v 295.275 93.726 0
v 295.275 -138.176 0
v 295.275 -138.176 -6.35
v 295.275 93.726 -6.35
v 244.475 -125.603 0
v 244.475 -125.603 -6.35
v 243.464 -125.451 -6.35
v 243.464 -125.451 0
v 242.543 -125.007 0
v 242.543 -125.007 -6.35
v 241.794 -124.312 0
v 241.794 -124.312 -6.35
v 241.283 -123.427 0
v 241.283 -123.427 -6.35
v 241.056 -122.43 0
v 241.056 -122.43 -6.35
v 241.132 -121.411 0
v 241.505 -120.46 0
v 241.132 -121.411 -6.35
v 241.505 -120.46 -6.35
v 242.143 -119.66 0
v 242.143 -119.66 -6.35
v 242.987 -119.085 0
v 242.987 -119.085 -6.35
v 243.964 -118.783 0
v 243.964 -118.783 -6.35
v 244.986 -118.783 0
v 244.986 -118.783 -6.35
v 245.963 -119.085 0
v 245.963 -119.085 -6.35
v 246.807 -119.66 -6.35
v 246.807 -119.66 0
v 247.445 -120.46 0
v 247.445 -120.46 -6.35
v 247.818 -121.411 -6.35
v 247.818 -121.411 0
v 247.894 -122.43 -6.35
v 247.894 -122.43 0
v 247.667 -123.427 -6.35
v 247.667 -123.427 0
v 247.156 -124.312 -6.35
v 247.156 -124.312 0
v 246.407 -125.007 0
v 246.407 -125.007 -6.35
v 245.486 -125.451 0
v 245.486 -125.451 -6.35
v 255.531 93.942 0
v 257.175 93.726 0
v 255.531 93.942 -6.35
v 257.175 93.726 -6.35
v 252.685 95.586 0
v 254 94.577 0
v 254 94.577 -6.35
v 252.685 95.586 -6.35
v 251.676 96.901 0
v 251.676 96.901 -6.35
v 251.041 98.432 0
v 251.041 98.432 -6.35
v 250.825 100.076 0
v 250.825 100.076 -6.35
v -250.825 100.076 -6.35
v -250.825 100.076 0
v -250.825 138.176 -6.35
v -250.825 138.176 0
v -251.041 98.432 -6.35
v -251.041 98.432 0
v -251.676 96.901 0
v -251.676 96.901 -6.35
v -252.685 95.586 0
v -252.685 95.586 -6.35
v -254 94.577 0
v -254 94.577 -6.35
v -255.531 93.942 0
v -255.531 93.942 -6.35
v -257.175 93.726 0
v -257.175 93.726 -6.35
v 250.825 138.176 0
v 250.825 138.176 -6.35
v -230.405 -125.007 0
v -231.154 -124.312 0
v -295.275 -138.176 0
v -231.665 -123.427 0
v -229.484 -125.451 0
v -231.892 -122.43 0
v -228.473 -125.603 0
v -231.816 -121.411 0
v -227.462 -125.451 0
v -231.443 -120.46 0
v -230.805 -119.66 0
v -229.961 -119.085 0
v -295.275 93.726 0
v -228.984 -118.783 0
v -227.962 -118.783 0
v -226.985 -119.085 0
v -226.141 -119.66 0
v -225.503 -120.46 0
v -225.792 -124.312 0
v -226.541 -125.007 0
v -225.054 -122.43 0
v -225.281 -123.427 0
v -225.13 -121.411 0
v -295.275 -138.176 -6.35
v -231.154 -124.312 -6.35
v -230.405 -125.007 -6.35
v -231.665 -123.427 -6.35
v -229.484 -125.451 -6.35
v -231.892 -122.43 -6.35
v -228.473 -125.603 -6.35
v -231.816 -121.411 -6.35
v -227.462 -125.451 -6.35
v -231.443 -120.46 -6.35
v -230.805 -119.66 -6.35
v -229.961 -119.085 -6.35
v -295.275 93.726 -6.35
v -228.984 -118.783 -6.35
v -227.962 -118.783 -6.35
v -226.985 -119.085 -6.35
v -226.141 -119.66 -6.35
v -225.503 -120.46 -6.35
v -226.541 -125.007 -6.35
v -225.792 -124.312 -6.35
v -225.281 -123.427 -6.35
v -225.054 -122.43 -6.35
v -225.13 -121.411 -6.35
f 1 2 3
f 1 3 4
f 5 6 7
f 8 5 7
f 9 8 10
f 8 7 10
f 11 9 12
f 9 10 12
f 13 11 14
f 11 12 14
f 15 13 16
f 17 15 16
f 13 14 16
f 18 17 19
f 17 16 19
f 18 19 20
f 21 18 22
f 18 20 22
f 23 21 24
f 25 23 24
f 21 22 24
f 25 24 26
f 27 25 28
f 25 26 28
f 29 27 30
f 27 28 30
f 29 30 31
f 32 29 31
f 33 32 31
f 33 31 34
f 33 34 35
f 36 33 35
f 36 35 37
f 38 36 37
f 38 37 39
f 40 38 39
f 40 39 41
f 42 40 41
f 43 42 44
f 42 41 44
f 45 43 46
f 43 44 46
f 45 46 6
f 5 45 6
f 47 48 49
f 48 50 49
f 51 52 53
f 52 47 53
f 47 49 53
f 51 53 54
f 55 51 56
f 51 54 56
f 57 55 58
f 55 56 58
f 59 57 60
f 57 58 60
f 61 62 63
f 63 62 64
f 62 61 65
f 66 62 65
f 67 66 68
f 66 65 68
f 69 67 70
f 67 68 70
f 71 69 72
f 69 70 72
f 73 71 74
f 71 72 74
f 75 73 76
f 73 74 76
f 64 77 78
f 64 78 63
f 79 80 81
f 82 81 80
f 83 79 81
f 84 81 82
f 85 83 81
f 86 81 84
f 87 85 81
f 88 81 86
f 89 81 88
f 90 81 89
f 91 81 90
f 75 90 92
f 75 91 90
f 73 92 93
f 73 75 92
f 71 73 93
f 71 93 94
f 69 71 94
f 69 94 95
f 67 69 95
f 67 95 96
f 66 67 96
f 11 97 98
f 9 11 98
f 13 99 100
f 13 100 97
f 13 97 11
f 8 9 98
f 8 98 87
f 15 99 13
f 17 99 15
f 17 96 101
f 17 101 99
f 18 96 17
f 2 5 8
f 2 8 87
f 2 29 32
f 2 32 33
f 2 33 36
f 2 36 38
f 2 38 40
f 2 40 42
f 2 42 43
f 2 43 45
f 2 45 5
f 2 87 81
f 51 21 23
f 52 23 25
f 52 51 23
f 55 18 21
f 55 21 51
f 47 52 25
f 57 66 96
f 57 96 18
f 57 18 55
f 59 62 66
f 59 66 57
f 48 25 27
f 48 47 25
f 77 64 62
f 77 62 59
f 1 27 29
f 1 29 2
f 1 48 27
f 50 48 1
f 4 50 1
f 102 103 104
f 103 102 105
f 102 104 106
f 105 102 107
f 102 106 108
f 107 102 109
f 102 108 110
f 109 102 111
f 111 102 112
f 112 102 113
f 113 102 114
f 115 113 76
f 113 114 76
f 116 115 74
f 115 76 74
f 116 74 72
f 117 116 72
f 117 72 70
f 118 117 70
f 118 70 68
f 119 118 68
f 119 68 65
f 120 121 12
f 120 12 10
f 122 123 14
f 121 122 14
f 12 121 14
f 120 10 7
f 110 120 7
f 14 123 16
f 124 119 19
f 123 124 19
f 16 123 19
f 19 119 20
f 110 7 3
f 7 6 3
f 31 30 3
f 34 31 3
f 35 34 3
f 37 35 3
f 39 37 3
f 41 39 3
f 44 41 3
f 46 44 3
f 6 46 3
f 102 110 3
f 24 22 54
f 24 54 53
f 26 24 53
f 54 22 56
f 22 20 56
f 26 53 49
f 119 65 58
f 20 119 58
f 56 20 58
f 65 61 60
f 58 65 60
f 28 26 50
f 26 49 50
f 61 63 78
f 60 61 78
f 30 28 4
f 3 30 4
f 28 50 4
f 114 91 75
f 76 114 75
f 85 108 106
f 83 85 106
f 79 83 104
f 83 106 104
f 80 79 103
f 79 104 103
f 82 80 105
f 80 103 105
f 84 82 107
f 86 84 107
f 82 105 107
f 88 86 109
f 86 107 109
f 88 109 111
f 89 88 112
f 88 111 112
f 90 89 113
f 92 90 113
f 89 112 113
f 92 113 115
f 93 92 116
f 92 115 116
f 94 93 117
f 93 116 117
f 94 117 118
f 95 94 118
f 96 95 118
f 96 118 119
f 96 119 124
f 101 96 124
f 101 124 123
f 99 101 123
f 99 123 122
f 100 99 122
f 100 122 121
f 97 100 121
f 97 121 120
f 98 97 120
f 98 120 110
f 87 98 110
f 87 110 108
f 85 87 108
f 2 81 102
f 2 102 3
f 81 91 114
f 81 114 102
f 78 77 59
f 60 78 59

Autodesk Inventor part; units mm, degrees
ref_plane "YZ Plane" through (0, 0, 0) normal (1, 0, 0) x (0, 1, 0)
ref_plane "XZ Plane" through (0, 0, 0) normal (0, 1, 0) x (-1, 0, 0)
sketch "Sketch1" plane through (0, 0, 0) normal (0, 0, 1) x (1, 0, 0)
  line L0 (-295.275, -138.176) -> (295.275, -138.176)
  line L1 (295.275, -138.176) -> (295.275, 138.176)
  line L2 (295.275, 138.176) -> (-295.275, 138.176)
  line L3 (-295.275, 138.176) -> (-295.275, -138.176)
  line L4 (-295.275, -138.176) -> (295.275, 138.176) construction
  line L5 (295.275, -138.176) -> (-295.275, 138.176) construction
  point P0 (0, 0)
  dimension "d0" = 590.55
  dimension "d1" = 276.352
extrude "Extrusion1" add sketch "Sketch1" against normal blind 6.35
sketch "Sketch2" plane through (0, 0, 0) normal (0, 0, 1) x (1, 0, 0)
  line L0 (-295.275, -138.176) -> (295.275, -138.176) projected
  line L1 (295.275, 138.176) -> (-295.275, 138.176) projected
  line L2 (-295.275, 138.176) -> (-295.275, -138.176) projected
  line L3 (-295.275, 93.726) -> (-250.825, 93.726)
  line L4 (-250.825, 93.726) -> (-250.825, 138.176)
  point P0 (0, 0)
  dimension "d4" = 44.45
  dimension "d6" = 231.902
extrude "Extrusion2" cut sketch "Sketch2" against normal through all
fillet "Fillet1" radius 6.35 1 edges at (-250.825, 93.726, -3.175)
ref_plane "Work Plane1" through (0, -138.176, 0) normal (1, 0, 0) x (0, 1, 0)
mirror "Mirror1" about plane through (0, -138.176, 0) normal (1, 0, 0) of "Extrusion2", "Fillet1"
sketch "Sketch3" plane through (0, 0, 0) normal (0, 0, 1) x (1, 0, 0)
  line L0 (-295.275, 93.726) -> (-295.275, -138.176) projected
  line L1 (-295.275, -138.176) -> (295.275, -138.176) projected
  point P0 (0, 0)
  point P1 (-228.473, -122.174)
  point P2 (244.475, -122.174)
  dimension "d10" = 66.802
  dimension "d11" = 539.75
  dimension "d12" = 16.002
hole "Hole1" at (-228.473, -122.174, 0) at (244.475, -122.174, 0) direction (0, 0, -1) diameter 6.858 end through all
properties part number "GE-13042" material "Polycarbonate, Clear"
